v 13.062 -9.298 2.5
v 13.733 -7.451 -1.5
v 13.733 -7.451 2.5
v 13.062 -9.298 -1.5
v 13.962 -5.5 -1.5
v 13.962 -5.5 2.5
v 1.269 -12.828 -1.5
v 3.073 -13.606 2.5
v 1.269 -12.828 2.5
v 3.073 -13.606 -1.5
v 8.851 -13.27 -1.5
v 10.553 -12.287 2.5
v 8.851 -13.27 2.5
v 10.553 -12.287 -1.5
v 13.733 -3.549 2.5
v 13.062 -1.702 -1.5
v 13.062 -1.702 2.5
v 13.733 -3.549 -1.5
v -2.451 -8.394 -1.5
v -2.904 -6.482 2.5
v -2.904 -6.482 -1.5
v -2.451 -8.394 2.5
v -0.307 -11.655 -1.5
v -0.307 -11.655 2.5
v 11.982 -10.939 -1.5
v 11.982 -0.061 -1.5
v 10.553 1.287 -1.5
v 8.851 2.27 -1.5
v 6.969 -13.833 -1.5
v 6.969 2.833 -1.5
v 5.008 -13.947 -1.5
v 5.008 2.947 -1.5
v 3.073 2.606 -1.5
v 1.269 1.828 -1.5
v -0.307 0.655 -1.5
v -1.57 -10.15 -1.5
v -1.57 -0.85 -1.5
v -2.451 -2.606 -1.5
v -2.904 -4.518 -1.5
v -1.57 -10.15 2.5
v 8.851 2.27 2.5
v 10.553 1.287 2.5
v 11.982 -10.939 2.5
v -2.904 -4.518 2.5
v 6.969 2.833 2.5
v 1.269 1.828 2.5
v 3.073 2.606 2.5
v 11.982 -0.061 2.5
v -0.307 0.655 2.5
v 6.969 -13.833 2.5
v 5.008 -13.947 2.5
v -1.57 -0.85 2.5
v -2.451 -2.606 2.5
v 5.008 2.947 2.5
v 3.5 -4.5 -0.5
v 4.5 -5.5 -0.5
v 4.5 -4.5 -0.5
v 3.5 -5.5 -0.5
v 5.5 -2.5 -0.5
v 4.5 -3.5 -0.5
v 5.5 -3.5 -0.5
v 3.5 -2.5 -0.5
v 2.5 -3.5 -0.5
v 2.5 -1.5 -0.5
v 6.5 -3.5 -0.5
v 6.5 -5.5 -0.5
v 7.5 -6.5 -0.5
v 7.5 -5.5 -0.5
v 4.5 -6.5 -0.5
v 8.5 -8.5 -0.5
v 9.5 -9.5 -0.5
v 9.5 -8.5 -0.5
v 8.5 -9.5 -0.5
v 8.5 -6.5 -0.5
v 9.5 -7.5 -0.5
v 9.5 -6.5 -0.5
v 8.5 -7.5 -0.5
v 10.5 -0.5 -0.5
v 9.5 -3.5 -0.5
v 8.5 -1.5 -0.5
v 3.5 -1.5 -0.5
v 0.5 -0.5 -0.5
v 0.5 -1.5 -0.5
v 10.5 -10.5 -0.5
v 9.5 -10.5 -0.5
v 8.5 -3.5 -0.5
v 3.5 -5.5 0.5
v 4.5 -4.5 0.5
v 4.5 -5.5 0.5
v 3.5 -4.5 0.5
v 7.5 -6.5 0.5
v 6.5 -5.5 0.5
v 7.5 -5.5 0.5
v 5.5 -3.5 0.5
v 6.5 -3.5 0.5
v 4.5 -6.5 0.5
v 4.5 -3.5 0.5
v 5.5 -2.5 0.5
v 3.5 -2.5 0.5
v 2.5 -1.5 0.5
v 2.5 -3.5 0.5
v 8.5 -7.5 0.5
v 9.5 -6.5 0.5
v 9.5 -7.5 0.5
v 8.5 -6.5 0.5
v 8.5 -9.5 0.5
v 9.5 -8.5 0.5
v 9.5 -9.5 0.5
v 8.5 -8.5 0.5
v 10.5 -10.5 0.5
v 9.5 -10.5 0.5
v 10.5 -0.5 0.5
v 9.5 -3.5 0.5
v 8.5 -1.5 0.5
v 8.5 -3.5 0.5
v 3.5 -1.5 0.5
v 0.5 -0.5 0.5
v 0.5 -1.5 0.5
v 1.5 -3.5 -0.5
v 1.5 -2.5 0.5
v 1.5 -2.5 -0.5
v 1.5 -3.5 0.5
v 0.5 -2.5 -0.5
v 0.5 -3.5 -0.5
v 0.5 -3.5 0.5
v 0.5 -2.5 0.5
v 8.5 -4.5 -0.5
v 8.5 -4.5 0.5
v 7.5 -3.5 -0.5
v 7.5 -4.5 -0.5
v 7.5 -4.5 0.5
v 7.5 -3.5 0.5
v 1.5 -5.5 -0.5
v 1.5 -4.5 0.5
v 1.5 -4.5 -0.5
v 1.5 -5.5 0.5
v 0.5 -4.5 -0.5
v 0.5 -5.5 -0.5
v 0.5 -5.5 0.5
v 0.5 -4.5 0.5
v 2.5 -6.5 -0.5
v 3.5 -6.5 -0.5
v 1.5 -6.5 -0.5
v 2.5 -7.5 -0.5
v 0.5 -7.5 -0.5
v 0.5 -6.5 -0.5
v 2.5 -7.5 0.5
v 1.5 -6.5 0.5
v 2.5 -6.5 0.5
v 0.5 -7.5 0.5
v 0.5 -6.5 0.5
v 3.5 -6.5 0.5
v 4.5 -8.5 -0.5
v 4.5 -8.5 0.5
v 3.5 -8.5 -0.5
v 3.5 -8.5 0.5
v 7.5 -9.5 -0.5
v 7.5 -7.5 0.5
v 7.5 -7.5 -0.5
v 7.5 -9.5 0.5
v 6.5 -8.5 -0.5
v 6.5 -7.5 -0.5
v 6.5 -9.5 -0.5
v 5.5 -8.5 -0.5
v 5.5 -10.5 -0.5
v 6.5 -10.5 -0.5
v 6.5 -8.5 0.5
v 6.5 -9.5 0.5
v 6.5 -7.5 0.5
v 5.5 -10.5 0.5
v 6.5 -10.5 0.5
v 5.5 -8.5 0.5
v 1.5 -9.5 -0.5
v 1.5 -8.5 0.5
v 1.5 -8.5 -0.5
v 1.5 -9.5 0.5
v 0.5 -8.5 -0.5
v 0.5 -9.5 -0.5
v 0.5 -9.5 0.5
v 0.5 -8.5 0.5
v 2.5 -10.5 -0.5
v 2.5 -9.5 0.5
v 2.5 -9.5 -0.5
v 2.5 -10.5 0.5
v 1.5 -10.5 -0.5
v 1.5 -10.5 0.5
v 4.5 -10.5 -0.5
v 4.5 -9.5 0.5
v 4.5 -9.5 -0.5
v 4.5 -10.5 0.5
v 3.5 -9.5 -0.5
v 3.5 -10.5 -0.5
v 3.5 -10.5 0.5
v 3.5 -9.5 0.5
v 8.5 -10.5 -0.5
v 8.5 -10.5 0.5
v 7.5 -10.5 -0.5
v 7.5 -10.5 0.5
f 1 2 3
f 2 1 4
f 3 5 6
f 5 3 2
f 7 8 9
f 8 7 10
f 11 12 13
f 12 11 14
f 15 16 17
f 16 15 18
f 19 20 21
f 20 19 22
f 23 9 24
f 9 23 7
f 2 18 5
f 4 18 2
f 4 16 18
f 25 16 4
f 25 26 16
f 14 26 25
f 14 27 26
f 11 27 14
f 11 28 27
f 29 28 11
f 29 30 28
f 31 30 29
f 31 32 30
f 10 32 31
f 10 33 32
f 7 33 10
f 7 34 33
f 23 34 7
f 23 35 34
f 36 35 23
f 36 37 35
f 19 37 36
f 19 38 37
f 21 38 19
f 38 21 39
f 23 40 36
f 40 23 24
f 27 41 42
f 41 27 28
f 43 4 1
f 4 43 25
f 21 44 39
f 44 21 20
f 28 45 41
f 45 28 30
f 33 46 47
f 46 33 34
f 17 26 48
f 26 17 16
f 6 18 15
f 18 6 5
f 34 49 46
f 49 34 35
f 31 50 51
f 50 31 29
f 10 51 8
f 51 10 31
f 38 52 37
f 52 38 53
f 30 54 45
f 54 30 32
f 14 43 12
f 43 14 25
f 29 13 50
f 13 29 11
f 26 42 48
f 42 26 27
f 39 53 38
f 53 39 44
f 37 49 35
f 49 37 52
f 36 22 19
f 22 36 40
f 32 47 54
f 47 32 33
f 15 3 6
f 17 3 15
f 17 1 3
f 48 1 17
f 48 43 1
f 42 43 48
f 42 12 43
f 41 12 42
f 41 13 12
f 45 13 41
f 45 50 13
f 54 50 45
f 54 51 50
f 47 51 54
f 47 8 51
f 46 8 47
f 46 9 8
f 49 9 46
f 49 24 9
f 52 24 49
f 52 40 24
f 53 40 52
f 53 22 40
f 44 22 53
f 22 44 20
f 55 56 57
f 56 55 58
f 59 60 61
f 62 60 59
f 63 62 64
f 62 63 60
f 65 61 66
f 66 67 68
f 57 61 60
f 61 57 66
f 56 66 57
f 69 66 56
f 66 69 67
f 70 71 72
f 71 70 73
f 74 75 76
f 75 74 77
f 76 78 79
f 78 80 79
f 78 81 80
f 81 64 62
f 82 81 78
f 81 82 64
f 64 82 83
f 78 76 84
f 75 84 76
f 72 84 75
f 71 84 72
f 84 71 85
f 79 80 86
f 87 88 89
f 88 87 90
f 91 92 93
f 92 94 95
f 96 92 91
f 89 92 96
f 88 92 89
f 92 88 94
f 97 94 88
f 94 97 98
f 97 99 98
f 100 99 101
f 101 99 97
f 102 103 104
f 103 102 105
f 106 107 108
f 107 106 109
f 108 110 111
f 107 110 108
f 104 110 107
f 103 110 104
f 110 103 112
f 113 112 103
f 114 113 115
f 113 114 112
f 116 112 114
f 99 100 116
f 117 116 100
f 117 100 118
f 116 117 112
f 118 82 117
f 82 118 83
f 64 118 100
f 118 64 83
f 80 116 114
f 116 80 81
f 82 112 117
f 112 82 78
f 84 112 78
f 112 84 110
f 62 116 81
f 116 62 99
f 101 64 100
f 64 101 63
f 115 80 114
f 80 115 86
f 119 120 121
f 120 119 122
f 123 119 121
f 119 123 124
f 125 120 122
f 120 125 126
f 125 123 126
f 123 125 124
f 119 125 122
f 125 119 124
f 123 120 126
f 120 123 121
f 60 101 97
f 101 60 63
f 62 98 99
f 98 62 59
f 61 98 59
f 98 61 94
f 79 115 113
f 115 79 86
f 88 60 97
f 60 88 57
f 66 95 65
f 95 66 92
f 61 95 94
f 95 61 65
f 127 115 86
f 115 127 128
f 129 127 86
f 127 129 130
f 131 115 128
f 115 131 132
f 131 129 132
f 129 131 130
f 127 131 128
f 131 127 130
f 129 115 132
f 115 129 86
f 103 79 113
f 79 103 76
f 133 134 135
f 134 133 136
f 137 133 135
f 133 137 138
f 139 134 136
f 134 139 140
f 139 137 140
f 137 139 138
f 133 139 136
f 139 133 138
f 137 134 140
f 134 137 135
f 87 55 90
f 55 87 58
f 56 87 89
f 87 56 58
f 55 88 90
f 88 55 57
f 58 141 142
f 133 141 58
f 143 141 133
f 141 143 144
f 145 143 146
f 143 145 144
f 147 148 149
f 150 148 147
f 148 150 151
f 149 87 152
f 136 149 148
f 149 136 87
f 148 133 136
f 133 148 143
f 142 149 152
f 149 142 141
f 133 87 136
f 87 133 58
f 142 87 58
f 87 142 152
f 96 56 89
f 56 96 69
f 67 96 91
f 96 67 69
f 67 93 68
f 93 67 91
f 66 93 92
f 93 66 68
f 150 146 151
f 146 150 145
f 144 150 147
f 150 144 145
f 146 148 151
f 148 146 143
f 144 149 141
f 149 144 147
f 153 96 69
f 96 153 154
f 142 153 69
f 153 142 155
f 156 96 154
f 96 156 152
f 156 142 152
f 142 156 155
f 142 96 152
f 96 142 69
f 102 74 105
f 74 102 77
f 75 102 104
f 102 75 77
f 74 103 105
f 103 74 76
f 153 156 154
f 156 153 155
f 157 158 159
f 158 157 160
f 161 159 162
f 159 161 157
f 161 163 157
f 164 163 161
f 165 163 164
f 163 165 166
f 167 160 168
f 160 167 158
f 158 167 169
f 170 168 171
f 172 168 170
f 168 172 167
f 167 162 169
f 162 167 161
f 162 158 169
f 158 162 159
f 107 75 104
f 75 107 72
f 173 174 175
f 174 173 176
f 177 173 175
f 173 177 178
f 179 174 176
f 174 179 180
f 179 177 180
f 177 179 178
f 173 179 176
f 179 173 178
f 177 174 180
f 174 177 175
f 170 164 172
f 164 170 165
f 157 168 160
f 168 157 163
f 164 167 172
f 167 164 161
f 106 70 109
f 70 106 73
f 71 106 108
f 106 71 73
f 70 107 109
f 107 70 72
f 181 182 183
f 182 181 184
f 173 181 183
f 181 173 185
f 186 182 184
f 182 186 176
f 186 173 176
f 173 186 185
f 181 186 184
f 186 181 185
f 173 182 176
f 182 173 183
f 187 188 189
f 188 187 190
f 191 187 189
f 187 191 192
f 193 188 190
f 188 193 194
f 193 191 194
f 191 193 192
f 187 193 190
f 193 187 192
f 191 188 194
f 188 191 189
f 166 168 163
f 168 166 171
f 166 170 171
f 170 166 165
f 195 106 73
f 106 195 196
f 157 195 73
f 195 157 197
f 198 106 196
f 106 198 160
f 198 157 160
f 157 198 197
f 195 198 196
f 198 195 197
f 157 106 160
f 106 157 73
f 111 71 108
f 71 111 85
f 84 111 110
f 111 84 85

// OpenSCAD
rotate([180,0,0])difference(){translate([5.5,5.5,-0.5])  cylinder(r=8.46153846153846,h=4, center=true);
translate([1,1,0])  cube(size = [1,1,1], center=true);
translate([2,1,0])  cube(size = [1,1,1], center=true);
translate([3,1,0])  cube(size = [1,1,1], center=true);
translate([4,1,0])  cube(size = [1,1,1], center=true);
translate([5,1,0])  cube(size = [1,1,1], center=true);
translate([6,1,0])  cube(size = [1,1,1], center=true);
translate([7,1,0])  cube(size = [1,1,1], center=true);
translate([8,1,0])  cube(size = [1,1,1], center=true);
translate([9,1,0])  cube(size = [1,1,1], center=true);
translate([10,1,0])  cube(size = [1,1,1], center=true);
translate([10,1,0])  cube(size = [1,1,1], center=true);
translate([10,1,0])  cube(size = [1,1,1], center=true);
translate([3,2,0])  cube(size = [1,1,1], center=true);
translate([3,2,0])  cube(size = [1,1,1], center=true);
translate([3,2,0])  cube(size = [1,1,1], center=true);
translate([3,2,0])  cube(size = [1,1,1], center=true);
translate([3,2,0])  cube(size = [1,1,1], center=true);
translate([3,2,0])  cube(size = [1,1,1], center=true);
translate([9,2,0])  cube(size = [1,1,1], center=true);
translate([10,2,0])  cube(size = [1,1,1], center=true);
translate([1,3,0])  cube(size = [1,1,1], center=true);
translate([1,3,0])  cube(size = [1,1,1], center=true);
translate([3,3,0])  cube(size = [1,1,1], center=true);
translate([4,3,0])  cube(size = [1,1,1], center=true);
translate([5,3,0])  cube(size = [1,1,1], center=true);
translate([5,3,0])  cube(size = [1,1,1], center=true);
translate([5,3,0])  cube(size = [1,1,1], center=true);
translate([5,3,0])  cube(size = [1,1,1], center=true);
translate([9,3,0])  cube(size = [1,1,1], center=true);
translate([10,3,0])  cube(size = [1,1,1], center=true);
translate([10,3,0])  cube(size = [1,1,1], center=true);
translate([10,3,0])  cube(size = [1,1,1], center=true);
translate([10,3,0])  cube(size = [1,1,1], center=true);
translate([10,3,0])  cube(size = [1,1,1], center=true);
translate([5,4,0])  cube(size = [1,1,1], center=true);
translate([6,4,0])  cube(size = [1,1,1], center=true);
translate([6,4,0])  cube(size = [1,1,1], center=true);
translate([8,4,0])  cube(size = [1,1,1], center=true);
translate([8,4,0])  cube(size = [1,1,1], center=true);
translate([10,4,0])  cube(size = [1,1,1], center=true);
translate([1,5,0])  cube(size = [1,1,1], center=true);
translate([1,5,0])  cube(size = [1,1,1], center=true);
translate([1,5,0])  cube(size = [1,1,1], center=true);
translate([4,5,0])  cube(size = [1,1,1], center=true);
translate([5,5,0])  cube(size = [1,1,1], center=true);
translate([6,5,0])  cube(size = [1,1,1], center=true);
translate([6,5,0])  cube(size = [1,1,1], center=true);
translate([6,5,0])  cube(size = [1,1,1], center=true);
translate([6,5,0])  cube(size = [1,1,1], center=true);
translate([10,5,0])  cube(size = [1,1,1], center=true);
translate([10,5,0])  cube(size = [1,1,1], center=true);
translate([2,6,0])  cube(size = [1,1,1], center=true);
translate([3,6,0])  cube(size = [1,1,1], center=true);
translate([3,6,0])  cube(size = [1,1,1], center=true);
translate([5,6,0])  cube(size = [1,1,1], center=true);
translate([6,6,0])  cube(size = [1,1,1], center=true);
translate([7,6,0])  cube(size = [1,1,1], center=true);
translate([7,6,0])  cube(size = [1,1,1], center=true);
translate([7,6,0])  cube(size = [1,1,1], center=true);
translate([10,6,0])  cube(size = [1,1,1], center=true);
translate([1,7,0])  cube(size = [1,1,1], center=true);
translate([2,7,0])  cube(size = [1,1,1], center=true);
translate([2,7,0])  cube(size = [1,1,1], center=true);
translate([4,7,0])  cube(size = [1,1,1], center=true);
translate([4,7,0])  cube(size = [1,1,1], center=true);
translate([4,7,0])  cube(size = [1,1,1], center=true);
translate([4,7,0])  cube(size = [1,1,1], center=true);
translate([4,7,0])  cube(size = [1,1,1], center=true);
translate([9,7,0])  cube(size = [1,1,1], center=true);
translate([10,7,0])  cube(size = [1,1,1], center=true);
translate([10,7,0])  cube(size = [1,1,1], center=true);
translate([10,7,0])  cube(size = [1,1,1], center=true);
translate([10,7,0])  cube(size = [1,1,1], center=true);
translate([4,8,0])  cube(size = [1,1,1], center=true);
translate([4,8,0])  cube(size = [1,1,1], center=true);
translate([4,8,0])  cube(size = [1,1,1], center=true);
translate([7,8,0])  cube(size = [1,1,1], center=true);
translate([7,8,0])  cube(size = [1,1,1], center=true);
translate([7,8,0])  cube(size = [1,1,1], center=true);
translate([10,8,0])  cube(size = [1,1,1], center=true);
translate([1,9,0])  cube(size = [1,1,1], center=true);
translate([1,9,0])  cube(size = [1,1,1], center=true);
translate([1,9,0])  cube(size = [1,1,1], center=true);
translate([1,9,0])  cube(size = [1,1,1], center=true);
translate([1,9,0])  cube(size = [1,1,1], center=true);
translate([6,9,0])  cube(size = [1,1,1], center=true);
translate([7,9,0])  cube(size = [1,1,1], center=true);
translate([7,9,0])  cube(size = [1,1,1], center=true);
translate([9,9,0])  cube(size = [1,1,1], center=true);
translate([10,9,0])  cube(size = [1,1,1], center=true);
translate([10,9,0])  cube(size = [1,1,1], center=true);
translate([2,10,0])  cube(size = [1,1,1], center=true);
translate([2,10,0])  cube(size = [1,1,1], center=true);
translate([4,10,0])  cube(size = [1,1,1], center=true);
translate([4,10,0])  cube(size = [1,1,1], center=true);
translate([6,10,0])  cube(size = [1,1,1], center=true);
translate([6,10,0])  cube(size = [1,1,1], center=true);
translate([8,10,0])  cube(size = [1,1,1], center=true);
translate([8,10,0])  cube(size = [1,1,1], center=true);
translate([10,10,0])  cube(size = [1,1,1], center=true);
}
